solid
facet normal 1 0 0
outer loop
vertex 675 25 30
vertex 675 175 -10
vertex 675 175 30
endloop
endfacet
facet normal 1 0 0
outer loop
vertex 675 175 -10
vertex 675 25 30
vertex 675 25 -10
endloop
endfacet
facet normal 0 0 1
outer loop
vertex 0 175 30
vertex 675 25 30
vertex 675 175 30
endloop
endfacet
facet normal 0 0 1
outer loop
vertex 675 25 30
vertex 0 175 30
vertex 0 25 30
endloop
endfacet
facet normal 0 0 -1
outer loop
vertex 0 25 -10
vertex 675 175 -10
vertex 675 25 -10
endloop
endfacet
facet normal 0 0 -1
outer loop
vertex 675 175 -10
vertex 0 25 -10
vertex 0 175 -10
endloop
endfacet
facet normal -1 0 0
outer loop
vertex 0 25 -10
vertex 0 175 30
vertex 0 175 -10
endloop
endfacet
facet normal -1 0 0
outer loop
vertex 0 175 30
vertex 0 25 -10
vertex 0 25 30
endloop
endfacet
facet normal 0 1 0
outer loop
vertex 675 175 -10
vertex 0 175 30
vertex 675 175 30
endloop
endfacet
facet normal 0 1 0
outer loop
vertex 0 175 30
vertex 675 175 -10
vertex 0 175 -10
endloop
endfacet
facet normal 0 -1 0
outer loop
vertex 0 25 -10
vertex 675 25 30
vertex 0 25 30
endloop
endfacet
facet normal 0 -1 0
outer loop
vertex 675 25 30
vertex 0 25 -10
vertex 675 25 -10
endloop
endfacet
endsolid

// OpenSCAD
difference(){
translate([0,25,-10])
cube([675,150,40]);
linear_extrude(file = "nuvodia_plain.dxf", height = 30);
translate([0,0,10])
linear_extrude(file = "nuvodia_o.dxf", height = 25);
}
